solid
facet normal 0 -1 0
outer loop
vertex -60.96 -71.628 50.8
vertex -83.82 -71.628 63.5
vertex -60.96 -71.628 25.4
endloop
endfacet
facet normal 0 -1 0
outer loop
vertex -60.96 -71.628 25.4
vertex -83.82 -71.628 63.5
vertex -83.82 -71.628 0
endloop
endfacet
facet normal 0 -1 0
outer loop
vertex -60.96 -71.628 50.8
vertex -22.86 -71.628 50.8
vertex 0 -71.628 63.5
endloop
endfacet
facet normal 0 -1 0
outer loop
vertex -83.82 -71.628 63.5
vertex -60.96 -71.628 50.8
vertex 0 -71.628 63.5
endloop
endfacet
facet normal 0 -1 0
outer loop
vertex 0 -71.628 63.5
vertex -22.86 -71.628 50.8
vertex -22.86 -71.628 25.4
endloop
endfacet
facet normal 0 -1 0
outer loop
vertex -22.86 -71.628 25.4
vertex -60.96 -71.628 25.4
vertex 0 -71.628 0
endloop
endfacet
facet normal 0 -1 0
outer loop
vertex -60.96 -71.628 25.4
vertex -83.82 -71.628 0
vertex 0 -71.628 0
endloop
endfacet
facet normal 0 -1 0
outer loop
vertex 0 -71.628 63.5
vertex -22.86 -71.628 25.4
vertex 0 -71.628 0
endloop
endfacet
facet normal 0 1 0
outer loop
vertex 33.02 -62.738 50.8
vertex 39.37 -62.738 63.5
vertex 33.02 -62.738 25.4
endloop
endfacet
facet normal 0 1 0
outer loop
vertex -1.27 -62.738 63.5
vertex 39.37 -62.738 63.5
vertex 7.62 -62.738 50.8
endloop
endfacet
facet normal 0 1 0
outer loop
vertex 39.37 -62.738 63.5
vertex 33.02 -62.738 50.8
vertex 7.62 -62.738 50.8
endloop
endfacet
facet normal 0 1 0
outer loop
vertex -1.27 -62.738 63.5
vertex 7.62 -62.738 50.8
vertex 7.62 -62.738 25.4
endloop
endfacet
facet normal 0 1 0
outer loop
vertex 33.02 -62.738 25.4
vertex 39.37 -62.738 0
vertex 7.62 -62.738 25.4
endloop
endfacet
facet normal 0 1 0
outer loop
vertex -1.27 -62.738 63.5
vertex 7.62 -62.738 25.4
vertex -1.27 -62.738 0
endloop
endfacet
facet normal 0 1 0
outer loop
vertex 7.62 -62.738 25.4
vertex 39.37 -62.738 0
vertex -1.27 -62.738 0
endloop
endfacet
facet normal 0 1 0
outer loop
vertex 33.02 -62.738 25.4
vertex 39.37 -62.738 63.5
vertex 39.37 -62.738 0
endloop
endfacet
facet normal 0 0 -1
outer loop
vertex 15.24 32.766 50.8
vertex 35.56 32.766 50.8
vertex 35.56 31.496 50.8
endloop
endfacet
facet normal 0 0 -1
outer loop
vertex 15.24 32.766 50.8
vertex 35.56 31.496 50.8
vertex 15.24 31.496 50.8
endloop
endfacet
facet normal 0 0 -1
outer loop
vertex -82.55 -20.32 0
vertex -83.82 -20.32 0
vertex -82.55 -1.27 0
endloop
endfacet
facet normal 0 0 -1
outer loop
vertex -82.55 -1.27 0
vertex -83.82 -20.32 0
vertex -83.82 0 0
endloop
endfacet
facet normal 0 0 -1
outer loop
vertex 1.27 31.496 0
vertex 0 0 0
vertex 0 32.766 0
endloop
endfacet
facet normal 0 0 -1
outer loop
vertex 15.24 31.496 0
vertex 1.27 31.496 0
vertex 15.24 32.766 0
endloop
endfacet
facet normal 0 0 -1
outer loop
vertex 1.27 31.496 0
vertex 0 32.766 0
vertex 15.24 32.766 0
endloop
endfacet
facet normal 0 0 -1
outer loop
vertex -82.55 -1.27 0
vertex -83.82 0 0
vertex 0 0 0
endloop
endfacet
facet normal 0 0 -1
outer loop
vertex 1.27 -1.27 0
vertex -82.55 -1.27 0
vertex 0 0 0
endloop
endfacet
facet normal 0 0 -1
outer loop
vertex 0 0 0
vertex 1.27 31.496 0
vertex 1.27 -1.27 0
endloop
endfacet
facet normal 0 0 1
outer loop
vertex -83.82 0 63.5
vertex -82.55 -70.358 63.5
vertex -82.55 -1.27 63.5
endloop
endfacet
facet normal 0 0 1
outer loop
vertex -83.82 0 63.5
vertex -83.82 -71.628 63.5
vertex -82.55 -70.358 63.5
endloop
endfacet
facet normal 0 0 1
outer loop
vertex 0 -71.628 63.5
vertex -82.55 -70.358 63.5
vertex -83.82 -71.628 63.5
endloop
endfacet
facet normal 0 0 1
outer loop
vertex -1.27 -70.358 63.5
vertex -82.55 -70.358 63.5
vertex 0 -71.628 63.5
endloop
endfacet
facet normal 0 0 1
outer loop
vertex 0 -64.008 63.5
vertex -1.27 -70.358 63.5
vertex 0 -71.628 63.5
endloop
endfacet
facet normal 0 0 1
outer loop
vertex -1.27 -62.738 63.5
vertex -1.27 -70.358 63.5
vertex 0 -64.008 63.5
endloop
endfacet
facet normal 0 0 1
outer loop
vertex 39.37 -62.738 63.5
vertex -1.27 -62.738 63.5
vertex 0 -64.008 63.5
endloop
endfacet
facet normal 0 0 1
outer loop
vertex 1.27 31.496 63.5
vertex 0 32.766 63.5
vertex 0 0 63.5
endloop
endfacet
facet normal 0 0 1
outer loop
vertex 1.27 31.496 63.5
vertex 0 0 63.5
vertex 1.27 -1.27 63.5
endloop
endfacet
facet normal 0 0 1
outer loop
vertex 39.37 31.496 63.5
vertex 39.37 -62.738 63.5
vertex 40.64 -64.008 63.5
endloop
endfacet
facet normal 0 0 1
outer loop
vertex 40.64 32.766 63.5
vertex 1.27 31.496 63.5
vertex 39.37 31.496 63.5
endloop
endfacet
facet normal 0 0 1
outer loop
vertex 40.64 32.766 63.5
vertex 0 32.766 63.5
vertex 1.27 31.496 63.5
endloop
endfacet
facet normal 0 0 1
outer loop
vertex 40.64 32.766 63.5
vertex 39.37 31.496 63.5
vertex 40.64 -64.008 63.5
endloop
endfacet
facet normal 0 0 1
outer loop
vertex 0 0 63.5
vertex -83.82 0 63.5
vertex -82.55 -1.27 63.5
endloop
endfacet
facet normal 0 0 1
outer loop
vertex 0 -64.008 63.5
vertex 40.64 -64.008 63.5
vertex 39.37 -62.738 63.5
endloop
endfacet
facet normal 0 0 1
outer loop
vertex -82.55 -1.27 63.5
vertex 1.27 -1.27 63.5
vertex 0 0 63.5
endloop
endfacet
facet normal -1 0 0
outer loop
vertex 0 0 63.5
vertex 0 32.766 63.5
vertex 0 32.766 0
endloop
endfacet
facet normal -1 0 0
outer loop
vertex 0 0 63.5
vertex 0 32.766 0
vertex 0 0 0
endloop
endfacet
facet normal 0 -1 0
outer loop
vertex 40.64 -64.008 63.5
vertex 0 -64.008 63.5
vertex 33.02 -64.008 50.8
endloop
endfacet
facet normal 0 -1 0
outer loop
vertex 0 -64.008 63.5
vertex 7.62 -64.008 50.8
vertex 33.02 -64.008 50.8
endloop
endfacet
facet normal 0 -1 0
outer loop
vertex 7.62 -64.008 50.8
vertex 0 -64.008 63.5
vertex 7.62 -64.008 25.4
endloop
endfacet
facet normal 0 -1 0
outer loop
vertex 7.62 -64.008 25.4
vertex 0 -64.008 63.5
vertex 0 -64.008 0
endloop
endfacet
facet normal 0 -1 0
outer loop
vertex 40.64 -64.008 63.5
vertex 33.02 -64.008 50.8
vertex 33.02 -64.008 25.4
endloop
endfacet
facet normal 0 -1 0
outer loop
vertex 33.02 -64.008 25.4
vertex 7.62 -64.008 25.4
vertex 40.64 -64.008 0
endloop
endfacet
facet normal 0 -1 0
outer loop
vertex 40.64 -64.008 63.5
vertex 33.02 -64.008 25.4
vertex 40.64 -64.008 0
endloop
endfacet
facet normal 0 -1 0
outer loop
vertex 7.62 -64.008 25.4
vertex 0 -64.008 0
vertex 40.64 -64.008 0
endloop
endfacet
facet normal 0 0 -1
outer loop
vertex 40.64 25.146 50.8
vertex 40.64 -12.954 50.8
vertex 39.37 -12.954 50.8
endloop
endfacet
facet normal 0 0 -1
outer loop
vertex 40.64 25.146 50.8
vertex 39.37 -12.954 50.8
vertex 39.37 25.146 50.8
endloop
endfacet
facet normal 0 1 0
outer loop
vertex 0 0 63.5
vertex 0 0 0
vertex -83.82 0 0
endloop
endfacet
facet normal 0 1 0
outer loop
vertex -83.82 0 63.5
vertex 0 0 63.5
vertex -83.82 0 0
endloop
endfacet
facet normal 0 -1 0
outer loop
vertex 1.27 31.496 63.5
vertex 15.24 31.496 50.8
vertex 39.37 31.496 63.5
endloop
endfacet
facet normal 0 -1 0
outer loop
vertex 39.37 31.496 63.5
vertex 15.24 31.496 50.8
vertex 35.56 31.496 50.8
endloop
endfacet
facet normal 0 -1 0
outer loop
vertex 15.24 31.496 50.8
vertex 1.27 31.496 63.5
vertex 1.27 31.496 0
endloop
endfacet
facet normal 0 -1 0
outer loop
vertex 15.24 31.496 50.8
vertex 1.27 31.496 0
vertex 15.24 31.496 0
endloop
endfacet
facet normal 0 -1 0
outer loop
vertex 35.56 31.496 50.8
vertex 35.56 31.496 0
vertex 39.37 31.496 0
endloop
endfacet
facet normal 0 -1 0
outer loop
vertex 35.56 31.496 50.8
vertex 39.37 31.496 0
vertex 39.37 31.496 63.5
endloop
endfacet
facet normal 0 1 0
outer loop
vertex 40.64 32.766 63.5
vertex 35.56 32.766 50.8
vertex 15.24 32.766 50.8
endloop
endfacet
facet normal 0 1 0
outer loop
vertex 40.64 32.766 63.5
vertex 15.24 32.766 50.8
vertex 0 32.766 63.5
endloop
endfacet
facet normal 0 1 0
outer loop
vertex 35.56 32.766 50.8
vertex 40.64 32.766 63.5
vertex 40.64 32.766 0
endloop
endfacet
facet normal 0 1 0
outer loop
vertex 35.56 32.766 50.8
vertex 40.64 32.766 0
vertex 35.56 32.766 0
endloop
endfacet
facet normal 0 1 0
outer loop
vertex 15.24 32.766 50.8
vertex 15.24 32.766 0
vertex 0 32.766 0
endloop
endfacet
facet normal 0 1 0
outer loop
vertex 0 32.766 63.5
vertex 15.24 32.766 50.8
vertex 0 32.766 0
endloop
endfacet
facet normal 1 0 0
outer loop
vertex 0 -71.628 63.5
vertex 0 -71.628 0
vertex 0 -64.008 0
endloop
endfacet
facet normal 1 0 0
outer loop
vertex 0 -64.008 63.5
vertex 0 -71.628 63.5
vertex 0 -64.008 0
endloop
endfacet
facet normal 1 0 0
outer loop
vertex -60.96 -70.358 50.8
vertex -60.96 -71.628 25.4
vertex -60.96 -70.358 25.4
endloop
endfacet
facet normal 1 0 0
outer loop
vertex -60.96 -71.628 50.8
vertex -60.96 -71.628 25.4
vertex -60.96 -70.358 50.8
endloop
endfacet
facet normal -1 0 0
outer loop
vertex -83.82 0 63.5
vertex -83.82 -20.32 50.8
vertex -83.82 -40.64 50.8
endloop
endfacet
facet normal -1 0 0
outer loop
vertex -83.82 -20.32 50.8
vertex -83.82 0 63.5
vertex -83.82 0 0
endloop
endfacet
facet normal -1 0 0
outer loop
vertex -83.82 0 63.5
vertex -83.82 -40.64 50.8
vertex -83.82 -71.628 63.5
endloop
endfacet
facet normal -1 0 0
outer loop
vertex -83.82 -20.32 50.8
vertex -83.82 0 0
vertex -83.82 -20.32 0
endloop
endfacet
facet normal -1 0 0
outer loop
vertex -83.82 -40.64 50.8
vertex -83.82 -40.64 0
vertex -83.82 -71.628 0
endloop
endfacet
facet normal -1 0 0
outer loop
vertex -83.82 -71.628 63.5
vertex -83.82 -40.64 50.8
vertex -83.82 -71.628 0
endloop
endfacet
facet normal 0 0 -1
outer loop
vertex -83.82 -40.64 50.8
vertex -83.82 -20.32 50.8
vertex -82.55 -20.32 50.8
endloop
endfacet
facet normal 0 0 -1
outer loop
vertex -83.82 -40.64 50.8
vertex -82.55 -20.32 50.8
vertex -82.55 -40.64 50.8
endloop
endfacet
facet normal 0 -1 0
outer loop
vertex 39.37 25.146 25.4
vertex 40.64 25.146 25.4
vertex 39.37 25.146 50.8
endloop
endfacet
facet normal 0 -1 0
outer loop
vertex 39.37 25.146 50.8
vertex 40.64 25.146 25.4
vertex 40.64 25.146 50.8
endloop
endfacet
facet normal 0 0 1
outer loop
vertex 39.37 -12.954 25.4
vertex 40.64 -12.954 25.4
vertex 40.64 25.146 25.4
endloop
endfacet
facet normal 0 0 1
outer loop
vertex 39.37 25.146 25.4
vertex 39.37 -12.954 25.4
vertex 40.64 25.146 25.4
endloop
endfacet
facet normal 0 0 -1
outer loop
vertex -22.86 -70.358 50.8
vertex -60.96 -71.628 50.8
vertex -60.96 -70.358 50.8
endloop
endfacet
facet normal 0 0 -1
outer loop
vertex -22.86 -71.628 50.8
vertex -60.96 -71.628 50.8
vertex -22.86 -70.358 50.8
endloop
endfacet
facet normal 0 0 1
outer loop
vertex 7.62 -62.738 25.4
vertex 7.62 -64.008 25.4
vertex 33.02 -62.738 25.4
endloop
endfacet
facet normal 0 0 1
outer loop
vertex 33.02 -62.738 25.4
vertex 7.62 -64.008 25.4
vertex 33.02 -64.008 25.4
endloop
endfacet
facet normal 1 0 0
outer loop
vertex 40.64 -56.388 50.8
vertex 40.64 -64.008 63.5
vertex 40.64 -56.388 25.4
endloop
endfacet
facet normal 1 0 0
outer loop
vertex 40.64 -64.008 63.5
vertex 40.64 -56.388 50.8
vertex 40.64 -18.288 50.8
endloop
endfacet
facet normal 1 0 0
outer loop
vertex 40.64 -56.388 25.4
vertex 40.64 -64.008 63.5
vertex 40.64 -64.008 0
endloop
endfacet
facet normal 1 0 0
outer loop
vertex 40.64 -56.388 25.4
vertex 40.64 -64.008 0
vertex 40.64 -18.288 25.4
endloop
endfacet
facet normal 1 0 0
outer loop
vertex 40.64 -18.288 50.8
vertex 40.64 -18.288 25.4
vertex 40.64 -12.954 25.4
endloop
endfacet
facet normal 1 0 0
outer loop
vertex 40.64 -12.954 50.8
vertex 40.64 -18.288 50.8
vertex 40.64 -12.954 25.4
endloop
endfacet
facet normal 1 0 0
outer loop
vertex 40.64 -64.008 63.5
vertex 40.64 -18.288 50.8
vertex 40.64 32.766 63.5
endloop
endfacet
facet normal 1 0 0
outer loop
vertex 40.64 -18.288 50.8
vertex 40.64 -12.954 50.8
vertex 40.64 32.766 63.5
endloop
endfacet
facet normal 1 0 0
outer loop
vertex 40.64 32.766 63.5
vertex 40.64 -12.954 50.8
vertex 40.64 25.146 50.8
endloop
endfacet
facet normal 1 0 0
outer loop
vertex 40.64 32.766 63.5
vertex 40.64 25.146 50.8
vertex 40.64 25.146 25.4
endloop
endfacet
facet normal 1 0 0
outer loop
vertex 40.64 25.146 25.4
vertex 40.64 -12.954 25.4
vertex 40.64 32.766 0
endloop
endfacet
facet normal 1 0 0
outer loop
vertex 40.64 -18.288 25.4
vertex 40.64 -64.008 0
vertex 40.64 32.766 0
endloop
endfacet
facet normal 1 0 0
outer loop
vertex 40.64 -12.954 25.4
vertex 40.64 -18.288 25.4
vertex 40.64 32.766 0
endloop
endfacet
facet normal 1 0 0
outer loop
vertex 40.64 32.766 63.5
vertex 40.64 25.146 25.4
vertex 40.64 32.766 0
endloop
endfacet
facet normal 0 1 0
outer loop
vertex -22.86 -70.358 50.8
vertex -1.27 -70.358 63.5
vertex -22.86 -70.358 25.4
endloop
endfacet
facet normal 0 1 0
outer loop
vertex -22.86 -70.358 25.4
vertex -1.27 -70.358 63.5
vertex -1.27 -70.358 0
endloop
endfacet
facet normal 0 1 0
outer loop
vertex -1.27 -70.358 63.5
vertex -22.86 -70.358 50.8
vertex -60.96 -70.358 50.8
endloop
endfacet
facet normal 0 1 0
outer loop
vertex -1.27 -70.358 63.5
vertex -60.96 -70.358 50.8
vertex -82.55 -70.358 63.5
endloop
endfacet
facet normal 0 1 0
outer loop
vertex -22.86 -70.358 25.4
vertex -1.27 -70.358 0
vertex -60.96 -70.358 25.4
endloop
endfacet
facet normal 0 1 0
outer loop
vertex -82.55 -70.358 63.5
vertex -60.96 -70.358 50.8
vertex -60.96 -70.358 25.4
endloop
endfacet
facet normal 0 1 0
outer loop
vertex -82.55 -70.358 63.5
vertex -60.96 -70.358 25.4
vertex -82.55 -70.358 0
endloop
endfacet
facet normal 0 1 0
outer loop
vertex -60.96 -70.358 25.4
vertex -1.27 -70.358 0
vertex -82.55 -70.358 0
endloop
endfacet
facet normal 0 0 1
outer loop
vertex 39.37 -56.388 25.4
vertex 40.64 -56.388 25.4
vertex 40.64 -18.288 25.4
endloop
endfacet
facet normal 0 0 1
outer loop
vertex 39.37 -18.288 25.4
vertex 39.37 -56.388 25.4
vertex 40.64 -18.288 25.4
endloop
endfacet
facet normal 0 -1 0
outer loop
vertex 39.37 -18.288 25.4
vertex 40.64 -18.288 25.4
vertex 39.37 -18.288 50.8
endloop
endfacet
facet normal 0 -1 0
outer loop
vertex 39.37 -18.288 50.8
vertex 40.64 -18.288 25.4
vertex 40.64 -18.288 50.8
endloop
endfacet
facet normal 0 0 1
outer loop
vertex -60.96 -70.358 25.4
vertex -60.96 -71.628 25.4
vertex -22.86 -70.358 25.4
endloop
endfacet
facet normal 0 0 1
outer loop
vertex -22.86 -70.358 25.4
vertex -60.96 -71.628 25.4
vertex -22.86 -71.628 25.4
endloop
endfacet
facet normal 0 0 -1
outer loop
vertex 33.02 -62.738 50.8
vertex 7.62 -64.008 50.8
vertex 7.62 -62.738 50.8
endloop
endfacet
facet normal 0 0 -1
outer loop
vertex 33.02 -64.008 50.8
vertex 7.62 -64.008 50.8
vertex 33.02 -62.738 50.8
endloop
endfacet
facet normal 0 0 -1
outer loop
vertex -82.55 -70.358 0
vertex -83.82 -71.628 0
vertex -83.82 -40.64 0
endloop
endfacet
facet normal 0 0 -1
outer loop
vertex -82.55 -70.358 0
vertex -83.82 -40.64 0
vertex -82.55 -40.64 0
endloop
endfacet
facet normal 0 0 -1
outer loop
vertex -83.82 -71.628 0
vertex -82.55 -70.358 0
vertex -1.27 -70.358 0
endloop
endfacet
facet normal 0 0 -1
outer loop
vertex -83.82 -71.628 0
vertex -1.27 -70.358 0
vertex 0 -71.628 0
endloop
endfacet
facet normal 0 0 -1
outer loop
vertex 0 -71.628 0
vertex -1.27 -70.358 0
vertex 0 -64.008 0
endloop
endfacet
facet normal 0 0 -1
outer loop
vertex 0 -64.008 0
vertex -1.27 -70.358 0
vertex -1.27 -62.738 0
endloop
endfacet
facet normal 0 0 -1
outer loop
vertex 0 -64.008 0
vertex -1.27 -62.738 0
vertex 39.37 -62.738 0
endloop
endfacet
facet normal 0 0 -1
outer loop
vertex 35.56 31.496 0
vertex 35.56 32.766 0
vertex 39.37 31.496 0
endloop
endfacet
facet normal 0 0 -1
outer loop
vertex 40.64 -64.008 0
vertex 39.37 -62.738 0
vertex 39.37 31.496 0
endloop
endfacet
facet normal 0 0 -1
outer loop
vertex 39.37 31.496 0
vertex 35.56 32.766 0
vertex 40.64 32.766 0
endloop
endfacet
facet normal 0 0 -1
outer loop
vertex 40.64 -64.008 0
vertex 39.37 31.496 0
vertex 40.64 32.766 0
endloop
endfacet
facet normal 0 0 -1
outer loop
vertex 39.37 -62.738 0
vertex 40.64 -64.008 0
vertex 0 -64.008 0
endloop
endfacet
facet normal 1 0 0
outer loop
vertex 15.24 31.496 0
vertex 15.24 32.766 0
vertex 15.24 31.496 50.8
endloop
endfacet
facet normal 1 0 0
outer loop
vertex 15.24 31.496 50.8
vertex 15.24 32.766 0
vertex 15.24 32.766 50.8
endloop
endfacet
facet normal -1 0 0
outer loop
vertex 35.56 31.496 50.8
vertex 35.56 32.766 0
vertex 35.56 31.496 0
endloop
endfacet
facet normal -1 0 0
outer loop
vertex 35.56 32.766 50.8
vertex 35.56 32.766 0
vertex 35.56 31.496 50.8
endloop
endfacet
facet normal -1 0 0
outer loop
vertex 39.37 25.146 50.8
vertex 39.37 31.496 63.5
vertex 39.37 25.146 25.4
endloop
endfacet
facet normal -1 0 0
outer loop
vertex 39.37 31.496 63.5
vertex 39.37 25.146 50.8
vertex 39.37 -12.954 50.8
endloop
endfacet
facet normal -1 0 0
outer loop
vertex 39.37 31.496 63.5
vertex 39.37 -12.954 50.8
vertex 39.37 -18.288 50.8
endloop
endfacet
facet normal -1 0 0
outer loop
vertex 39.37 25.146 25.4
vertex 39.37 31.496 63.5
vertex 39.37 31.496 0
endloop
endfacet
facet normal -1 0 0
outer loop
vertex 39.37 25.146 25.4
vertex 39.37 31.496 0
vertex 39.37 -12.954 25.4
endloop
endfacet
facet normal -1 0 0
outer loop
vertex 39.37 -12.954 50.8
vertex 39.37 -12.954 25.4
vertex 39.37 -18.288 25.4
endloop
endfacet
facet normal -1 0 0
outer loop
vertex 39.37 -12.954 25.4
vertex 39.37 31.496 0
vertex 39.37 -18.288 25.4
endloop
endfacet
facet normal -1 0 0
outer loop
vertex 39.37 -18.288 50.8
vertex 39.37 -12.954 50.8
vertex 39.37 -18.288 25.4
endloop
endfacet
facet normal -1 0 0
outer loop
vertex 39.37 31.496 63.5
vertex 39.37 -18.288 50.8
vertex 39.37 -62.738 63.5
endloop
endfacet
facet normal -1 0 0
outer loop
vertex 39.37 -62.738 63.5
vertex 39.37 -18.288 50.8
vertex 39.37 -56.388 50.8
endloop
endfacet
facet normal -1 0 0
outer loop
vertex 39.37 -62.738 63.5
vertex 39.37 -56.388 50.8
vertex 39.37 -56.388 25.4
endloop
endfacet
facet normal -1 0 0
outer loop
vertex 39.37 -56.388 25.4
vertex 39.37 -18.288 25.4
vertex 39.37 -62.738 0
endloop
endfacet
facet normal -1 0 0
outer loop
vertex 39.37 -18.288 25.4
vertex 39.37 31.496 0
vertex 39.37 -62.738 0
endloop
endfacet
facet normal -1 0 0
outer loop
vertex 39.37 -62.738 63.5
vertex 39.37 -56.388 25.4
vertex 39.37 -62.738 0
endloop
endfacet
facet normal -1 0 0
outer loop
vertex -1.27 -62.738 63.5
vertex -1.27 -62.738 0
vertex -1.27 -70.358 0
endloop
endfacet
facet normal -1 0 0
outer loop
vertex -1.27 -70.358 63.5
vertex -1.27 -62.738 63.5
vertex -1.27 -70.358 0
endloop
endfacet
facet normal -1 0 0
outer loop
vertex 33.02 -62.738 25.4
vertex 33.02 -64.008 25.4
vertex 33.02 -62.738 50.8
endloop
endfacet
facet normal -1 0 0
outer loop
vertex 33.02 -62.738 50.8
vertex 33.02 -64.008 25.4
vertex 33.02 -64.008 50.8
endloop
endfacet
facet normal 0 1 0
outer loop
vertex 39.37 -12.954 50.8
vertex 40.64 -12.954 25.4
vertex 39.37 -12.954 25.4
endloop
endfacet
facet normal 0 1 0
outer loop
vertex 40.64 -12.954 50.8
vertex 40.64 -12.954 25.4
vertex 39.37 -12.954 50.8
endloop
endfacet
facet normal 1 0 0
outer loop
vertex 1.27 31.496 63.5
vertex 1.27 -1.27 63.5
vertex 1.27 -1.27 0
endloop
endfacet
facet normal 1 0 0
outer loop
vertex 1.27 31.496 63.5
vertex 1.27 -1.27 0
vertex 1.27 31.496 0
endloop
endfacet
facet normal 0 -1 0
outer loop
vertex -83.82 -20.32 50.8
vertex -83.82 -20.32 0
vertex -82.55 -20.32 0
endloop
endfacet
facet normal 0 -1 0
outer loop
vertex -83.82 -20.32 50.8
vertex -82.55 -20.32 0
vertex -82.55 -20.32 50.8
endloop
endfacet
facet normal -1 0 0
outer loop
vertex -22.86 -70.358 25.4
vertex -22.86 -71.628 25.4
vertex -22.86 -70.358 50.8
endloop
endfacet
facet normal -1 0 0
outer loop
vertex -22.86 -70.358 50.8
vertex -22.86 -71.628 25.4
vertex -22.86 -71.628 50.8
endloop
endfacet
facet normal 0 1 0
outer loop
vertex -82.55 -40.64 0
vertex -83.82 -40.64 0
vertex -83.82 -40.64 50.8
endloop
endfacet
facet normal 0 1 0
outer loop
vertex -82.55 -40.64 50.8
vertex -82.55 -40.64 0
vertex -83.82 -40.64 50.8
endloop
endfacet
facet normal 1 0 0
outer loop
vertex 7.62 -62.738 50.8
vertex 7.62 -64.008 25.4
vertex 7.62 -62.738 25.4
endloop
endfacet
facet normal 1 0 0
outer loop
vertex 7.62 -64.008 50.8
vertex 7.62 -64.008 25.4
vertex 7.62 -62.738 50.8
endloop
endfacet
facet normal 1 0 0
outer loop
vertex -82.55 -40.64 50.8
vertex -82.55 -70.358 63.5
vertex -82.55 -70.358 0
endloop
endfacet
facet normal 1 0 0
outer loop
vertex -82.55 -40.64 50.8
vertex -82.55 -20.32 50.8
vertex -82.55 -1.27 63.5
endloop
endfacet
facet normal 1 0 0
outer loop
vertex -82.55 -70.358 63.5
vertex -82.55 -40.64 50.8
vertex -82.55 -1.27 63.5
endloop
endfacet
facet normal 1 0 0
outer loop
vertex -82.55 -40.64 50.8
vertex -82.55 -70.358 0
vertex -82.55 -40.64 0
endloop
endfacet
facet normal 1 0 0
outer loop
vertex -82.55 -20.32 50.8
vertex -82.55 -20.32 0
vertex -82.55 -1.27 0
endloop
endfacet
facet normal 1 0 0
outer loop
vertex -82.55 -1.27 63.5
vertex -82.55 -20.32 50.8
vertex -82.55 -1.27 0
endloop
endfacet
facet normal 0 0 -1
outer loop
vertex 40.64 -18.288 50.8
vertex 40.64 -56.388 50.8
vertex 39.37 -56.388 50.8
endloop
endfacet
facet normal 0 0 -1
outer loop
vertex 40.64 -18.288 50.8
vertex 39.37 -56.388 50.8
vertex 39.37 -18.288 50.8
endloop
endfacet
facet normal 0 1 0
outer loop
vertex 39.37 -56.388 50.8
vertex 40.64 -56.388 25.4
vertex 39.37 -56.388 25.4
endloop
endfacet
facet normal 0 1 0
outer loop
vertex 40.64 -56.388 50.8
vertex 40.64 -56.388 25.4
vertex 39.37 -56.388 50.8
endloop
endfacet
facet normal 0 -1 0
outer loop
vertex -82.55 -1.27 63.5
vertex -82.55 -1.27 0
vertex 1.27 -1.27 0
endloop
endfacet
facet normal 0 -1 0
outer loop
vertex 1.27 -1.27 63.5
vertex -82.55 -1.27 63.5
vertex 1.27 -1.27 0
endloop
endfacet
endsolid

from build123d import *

# Parameters (mm, degrees)
F1_DEPTH  = 63.5
F2_W      = 38.1
F2_H      = 25.4
F3_DEPTH  = 1.27
F4_W      = 25.4
F4_H      = 25.4
F5_DEPTH  = 1.27
F6_W      = 38.1
F6_H      = 25.4
F7_DEPTH  = 1.27
F8_W      = 20.32
F8_H      = 50.8
F9_DEPTH  = 1.27
F10_W     = 20.32
F10_H     = 50.8
F11_DEPTH = 1.27


with BuildPart() as f1:
    # F0 (on Top) → F1 (new body)
    with BuildSketch(Plane.XY):
        Polygon((0, 32.766), (0, 0), (-83.82, 0), (-83.82, -71.628), (0, -71.628), (0, -64.008), (40.64, -64.008), (40.64, 32.766), align=None)
        Polygon((1.27, -1.27), (1.27, 31.496), (39.37, 31.496), (39.37, -62.738), (-1.27, -62.738), (-1.27, -70.358), (-82.55, -70.358), (-82.55, -1.27), align=None, mode=Mode.SUBTRACT)
    extrude(amount=F1_DEPTH)

    # F2 (on face) → F3 (cut)
    with BuildSketch(Plane.XZ.offset(71.628)):
        with Locations((-41.91, 38.1)):
            Rectangle(F2_W, F2_H)
    extrude(amount=-F3_DEPTH, mode=Mode.SUBTRACT)

    # F4 (on face) → F5 (cut)
    with BuildSketch(Plane.XZ.offset(64.008)):
        with Locations((20.32, 38.1)):
            Rectangle(F4_W, F4_H)
    extrude(amount=-F5_DEPTH, mode=Mode.SUBTRACT)

    # F6 (on face) → F7 (cut)
    with BuildSketch(Plane.YZ.offset(40.64)):
        with Locations((-37.338, 38.1)):
            Rectangle(F6_W, F6_H)
        with Locations((6.096, 38.1)):
            Rectangle(F6_W, F6_H)
    extrude(amount=-F7_DEPTH, mode=Mode.SUBTRACT)

    # F8 (on face) → F9 (cut)
    with BuildSketch(Plane(origin=(0, 32.766, 0), x_dir=(-1, 0, 0), z_dir=(0, 1, 0))):
        with Locations((-25.4, 25.4)):
            Rectangle(F8_W, F8_H)
    extrude(amount=-F9_DEPTH, mode=Mode.SUBTRACT)

    # F10 (on face) → F11 (cut)
    with BuildSketch(Plane(origin=(-83.82, 0, 0), x_dir=(0, -1, 0), z_dir=(-1, 0, 0))):
        with Locations((30.48, 25.4)):
            Rectangle(F10_W, F10_H)
    extrude(amount=-F11_DEPTH, mode=Mode.SUBTRACT)


solid = f1.part
